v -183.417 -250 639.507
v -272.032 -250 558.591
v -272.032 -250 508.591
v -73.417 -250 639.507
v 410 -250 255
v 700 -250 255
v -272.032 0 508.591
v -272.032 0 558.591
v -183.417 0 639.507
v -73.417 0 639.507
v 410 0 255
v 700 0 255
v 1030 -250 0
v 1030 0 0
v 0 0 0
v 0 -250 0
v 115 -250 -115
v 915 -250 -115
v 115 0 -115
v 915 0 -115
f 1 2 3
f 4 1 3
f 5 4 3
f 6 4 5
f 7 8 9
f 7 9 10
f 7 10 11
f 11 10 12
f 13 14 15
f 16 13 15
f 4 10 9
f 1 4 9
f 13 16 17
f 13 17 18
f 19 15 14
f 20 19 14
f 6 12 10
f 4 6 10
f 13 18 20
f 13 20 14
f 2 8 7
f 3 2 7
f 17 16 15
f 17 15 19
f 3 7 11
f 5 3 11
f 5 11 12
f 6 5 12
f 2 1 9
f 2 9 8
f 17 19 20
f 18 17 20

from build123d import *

# Parameters (mm, degrees)
F1_DEPTH = 250


with BuildPart() as f1:
    # F0 (on Front) → F1 (new body)
    with BuildSketch(Plane.XZ):
        Polygon((1030, 0), (0, 0), (115, -115), (915, -115), align=None)
        Polygon((-272.03194, 508.590833), (410, 255), (700, 255), (-73.417299, 639.507119), (-183.417299, 639.507119), (-272.03194, 558.590833), align=None)
    extrude(amount=F1_DEPTH)


solid = f1.part
